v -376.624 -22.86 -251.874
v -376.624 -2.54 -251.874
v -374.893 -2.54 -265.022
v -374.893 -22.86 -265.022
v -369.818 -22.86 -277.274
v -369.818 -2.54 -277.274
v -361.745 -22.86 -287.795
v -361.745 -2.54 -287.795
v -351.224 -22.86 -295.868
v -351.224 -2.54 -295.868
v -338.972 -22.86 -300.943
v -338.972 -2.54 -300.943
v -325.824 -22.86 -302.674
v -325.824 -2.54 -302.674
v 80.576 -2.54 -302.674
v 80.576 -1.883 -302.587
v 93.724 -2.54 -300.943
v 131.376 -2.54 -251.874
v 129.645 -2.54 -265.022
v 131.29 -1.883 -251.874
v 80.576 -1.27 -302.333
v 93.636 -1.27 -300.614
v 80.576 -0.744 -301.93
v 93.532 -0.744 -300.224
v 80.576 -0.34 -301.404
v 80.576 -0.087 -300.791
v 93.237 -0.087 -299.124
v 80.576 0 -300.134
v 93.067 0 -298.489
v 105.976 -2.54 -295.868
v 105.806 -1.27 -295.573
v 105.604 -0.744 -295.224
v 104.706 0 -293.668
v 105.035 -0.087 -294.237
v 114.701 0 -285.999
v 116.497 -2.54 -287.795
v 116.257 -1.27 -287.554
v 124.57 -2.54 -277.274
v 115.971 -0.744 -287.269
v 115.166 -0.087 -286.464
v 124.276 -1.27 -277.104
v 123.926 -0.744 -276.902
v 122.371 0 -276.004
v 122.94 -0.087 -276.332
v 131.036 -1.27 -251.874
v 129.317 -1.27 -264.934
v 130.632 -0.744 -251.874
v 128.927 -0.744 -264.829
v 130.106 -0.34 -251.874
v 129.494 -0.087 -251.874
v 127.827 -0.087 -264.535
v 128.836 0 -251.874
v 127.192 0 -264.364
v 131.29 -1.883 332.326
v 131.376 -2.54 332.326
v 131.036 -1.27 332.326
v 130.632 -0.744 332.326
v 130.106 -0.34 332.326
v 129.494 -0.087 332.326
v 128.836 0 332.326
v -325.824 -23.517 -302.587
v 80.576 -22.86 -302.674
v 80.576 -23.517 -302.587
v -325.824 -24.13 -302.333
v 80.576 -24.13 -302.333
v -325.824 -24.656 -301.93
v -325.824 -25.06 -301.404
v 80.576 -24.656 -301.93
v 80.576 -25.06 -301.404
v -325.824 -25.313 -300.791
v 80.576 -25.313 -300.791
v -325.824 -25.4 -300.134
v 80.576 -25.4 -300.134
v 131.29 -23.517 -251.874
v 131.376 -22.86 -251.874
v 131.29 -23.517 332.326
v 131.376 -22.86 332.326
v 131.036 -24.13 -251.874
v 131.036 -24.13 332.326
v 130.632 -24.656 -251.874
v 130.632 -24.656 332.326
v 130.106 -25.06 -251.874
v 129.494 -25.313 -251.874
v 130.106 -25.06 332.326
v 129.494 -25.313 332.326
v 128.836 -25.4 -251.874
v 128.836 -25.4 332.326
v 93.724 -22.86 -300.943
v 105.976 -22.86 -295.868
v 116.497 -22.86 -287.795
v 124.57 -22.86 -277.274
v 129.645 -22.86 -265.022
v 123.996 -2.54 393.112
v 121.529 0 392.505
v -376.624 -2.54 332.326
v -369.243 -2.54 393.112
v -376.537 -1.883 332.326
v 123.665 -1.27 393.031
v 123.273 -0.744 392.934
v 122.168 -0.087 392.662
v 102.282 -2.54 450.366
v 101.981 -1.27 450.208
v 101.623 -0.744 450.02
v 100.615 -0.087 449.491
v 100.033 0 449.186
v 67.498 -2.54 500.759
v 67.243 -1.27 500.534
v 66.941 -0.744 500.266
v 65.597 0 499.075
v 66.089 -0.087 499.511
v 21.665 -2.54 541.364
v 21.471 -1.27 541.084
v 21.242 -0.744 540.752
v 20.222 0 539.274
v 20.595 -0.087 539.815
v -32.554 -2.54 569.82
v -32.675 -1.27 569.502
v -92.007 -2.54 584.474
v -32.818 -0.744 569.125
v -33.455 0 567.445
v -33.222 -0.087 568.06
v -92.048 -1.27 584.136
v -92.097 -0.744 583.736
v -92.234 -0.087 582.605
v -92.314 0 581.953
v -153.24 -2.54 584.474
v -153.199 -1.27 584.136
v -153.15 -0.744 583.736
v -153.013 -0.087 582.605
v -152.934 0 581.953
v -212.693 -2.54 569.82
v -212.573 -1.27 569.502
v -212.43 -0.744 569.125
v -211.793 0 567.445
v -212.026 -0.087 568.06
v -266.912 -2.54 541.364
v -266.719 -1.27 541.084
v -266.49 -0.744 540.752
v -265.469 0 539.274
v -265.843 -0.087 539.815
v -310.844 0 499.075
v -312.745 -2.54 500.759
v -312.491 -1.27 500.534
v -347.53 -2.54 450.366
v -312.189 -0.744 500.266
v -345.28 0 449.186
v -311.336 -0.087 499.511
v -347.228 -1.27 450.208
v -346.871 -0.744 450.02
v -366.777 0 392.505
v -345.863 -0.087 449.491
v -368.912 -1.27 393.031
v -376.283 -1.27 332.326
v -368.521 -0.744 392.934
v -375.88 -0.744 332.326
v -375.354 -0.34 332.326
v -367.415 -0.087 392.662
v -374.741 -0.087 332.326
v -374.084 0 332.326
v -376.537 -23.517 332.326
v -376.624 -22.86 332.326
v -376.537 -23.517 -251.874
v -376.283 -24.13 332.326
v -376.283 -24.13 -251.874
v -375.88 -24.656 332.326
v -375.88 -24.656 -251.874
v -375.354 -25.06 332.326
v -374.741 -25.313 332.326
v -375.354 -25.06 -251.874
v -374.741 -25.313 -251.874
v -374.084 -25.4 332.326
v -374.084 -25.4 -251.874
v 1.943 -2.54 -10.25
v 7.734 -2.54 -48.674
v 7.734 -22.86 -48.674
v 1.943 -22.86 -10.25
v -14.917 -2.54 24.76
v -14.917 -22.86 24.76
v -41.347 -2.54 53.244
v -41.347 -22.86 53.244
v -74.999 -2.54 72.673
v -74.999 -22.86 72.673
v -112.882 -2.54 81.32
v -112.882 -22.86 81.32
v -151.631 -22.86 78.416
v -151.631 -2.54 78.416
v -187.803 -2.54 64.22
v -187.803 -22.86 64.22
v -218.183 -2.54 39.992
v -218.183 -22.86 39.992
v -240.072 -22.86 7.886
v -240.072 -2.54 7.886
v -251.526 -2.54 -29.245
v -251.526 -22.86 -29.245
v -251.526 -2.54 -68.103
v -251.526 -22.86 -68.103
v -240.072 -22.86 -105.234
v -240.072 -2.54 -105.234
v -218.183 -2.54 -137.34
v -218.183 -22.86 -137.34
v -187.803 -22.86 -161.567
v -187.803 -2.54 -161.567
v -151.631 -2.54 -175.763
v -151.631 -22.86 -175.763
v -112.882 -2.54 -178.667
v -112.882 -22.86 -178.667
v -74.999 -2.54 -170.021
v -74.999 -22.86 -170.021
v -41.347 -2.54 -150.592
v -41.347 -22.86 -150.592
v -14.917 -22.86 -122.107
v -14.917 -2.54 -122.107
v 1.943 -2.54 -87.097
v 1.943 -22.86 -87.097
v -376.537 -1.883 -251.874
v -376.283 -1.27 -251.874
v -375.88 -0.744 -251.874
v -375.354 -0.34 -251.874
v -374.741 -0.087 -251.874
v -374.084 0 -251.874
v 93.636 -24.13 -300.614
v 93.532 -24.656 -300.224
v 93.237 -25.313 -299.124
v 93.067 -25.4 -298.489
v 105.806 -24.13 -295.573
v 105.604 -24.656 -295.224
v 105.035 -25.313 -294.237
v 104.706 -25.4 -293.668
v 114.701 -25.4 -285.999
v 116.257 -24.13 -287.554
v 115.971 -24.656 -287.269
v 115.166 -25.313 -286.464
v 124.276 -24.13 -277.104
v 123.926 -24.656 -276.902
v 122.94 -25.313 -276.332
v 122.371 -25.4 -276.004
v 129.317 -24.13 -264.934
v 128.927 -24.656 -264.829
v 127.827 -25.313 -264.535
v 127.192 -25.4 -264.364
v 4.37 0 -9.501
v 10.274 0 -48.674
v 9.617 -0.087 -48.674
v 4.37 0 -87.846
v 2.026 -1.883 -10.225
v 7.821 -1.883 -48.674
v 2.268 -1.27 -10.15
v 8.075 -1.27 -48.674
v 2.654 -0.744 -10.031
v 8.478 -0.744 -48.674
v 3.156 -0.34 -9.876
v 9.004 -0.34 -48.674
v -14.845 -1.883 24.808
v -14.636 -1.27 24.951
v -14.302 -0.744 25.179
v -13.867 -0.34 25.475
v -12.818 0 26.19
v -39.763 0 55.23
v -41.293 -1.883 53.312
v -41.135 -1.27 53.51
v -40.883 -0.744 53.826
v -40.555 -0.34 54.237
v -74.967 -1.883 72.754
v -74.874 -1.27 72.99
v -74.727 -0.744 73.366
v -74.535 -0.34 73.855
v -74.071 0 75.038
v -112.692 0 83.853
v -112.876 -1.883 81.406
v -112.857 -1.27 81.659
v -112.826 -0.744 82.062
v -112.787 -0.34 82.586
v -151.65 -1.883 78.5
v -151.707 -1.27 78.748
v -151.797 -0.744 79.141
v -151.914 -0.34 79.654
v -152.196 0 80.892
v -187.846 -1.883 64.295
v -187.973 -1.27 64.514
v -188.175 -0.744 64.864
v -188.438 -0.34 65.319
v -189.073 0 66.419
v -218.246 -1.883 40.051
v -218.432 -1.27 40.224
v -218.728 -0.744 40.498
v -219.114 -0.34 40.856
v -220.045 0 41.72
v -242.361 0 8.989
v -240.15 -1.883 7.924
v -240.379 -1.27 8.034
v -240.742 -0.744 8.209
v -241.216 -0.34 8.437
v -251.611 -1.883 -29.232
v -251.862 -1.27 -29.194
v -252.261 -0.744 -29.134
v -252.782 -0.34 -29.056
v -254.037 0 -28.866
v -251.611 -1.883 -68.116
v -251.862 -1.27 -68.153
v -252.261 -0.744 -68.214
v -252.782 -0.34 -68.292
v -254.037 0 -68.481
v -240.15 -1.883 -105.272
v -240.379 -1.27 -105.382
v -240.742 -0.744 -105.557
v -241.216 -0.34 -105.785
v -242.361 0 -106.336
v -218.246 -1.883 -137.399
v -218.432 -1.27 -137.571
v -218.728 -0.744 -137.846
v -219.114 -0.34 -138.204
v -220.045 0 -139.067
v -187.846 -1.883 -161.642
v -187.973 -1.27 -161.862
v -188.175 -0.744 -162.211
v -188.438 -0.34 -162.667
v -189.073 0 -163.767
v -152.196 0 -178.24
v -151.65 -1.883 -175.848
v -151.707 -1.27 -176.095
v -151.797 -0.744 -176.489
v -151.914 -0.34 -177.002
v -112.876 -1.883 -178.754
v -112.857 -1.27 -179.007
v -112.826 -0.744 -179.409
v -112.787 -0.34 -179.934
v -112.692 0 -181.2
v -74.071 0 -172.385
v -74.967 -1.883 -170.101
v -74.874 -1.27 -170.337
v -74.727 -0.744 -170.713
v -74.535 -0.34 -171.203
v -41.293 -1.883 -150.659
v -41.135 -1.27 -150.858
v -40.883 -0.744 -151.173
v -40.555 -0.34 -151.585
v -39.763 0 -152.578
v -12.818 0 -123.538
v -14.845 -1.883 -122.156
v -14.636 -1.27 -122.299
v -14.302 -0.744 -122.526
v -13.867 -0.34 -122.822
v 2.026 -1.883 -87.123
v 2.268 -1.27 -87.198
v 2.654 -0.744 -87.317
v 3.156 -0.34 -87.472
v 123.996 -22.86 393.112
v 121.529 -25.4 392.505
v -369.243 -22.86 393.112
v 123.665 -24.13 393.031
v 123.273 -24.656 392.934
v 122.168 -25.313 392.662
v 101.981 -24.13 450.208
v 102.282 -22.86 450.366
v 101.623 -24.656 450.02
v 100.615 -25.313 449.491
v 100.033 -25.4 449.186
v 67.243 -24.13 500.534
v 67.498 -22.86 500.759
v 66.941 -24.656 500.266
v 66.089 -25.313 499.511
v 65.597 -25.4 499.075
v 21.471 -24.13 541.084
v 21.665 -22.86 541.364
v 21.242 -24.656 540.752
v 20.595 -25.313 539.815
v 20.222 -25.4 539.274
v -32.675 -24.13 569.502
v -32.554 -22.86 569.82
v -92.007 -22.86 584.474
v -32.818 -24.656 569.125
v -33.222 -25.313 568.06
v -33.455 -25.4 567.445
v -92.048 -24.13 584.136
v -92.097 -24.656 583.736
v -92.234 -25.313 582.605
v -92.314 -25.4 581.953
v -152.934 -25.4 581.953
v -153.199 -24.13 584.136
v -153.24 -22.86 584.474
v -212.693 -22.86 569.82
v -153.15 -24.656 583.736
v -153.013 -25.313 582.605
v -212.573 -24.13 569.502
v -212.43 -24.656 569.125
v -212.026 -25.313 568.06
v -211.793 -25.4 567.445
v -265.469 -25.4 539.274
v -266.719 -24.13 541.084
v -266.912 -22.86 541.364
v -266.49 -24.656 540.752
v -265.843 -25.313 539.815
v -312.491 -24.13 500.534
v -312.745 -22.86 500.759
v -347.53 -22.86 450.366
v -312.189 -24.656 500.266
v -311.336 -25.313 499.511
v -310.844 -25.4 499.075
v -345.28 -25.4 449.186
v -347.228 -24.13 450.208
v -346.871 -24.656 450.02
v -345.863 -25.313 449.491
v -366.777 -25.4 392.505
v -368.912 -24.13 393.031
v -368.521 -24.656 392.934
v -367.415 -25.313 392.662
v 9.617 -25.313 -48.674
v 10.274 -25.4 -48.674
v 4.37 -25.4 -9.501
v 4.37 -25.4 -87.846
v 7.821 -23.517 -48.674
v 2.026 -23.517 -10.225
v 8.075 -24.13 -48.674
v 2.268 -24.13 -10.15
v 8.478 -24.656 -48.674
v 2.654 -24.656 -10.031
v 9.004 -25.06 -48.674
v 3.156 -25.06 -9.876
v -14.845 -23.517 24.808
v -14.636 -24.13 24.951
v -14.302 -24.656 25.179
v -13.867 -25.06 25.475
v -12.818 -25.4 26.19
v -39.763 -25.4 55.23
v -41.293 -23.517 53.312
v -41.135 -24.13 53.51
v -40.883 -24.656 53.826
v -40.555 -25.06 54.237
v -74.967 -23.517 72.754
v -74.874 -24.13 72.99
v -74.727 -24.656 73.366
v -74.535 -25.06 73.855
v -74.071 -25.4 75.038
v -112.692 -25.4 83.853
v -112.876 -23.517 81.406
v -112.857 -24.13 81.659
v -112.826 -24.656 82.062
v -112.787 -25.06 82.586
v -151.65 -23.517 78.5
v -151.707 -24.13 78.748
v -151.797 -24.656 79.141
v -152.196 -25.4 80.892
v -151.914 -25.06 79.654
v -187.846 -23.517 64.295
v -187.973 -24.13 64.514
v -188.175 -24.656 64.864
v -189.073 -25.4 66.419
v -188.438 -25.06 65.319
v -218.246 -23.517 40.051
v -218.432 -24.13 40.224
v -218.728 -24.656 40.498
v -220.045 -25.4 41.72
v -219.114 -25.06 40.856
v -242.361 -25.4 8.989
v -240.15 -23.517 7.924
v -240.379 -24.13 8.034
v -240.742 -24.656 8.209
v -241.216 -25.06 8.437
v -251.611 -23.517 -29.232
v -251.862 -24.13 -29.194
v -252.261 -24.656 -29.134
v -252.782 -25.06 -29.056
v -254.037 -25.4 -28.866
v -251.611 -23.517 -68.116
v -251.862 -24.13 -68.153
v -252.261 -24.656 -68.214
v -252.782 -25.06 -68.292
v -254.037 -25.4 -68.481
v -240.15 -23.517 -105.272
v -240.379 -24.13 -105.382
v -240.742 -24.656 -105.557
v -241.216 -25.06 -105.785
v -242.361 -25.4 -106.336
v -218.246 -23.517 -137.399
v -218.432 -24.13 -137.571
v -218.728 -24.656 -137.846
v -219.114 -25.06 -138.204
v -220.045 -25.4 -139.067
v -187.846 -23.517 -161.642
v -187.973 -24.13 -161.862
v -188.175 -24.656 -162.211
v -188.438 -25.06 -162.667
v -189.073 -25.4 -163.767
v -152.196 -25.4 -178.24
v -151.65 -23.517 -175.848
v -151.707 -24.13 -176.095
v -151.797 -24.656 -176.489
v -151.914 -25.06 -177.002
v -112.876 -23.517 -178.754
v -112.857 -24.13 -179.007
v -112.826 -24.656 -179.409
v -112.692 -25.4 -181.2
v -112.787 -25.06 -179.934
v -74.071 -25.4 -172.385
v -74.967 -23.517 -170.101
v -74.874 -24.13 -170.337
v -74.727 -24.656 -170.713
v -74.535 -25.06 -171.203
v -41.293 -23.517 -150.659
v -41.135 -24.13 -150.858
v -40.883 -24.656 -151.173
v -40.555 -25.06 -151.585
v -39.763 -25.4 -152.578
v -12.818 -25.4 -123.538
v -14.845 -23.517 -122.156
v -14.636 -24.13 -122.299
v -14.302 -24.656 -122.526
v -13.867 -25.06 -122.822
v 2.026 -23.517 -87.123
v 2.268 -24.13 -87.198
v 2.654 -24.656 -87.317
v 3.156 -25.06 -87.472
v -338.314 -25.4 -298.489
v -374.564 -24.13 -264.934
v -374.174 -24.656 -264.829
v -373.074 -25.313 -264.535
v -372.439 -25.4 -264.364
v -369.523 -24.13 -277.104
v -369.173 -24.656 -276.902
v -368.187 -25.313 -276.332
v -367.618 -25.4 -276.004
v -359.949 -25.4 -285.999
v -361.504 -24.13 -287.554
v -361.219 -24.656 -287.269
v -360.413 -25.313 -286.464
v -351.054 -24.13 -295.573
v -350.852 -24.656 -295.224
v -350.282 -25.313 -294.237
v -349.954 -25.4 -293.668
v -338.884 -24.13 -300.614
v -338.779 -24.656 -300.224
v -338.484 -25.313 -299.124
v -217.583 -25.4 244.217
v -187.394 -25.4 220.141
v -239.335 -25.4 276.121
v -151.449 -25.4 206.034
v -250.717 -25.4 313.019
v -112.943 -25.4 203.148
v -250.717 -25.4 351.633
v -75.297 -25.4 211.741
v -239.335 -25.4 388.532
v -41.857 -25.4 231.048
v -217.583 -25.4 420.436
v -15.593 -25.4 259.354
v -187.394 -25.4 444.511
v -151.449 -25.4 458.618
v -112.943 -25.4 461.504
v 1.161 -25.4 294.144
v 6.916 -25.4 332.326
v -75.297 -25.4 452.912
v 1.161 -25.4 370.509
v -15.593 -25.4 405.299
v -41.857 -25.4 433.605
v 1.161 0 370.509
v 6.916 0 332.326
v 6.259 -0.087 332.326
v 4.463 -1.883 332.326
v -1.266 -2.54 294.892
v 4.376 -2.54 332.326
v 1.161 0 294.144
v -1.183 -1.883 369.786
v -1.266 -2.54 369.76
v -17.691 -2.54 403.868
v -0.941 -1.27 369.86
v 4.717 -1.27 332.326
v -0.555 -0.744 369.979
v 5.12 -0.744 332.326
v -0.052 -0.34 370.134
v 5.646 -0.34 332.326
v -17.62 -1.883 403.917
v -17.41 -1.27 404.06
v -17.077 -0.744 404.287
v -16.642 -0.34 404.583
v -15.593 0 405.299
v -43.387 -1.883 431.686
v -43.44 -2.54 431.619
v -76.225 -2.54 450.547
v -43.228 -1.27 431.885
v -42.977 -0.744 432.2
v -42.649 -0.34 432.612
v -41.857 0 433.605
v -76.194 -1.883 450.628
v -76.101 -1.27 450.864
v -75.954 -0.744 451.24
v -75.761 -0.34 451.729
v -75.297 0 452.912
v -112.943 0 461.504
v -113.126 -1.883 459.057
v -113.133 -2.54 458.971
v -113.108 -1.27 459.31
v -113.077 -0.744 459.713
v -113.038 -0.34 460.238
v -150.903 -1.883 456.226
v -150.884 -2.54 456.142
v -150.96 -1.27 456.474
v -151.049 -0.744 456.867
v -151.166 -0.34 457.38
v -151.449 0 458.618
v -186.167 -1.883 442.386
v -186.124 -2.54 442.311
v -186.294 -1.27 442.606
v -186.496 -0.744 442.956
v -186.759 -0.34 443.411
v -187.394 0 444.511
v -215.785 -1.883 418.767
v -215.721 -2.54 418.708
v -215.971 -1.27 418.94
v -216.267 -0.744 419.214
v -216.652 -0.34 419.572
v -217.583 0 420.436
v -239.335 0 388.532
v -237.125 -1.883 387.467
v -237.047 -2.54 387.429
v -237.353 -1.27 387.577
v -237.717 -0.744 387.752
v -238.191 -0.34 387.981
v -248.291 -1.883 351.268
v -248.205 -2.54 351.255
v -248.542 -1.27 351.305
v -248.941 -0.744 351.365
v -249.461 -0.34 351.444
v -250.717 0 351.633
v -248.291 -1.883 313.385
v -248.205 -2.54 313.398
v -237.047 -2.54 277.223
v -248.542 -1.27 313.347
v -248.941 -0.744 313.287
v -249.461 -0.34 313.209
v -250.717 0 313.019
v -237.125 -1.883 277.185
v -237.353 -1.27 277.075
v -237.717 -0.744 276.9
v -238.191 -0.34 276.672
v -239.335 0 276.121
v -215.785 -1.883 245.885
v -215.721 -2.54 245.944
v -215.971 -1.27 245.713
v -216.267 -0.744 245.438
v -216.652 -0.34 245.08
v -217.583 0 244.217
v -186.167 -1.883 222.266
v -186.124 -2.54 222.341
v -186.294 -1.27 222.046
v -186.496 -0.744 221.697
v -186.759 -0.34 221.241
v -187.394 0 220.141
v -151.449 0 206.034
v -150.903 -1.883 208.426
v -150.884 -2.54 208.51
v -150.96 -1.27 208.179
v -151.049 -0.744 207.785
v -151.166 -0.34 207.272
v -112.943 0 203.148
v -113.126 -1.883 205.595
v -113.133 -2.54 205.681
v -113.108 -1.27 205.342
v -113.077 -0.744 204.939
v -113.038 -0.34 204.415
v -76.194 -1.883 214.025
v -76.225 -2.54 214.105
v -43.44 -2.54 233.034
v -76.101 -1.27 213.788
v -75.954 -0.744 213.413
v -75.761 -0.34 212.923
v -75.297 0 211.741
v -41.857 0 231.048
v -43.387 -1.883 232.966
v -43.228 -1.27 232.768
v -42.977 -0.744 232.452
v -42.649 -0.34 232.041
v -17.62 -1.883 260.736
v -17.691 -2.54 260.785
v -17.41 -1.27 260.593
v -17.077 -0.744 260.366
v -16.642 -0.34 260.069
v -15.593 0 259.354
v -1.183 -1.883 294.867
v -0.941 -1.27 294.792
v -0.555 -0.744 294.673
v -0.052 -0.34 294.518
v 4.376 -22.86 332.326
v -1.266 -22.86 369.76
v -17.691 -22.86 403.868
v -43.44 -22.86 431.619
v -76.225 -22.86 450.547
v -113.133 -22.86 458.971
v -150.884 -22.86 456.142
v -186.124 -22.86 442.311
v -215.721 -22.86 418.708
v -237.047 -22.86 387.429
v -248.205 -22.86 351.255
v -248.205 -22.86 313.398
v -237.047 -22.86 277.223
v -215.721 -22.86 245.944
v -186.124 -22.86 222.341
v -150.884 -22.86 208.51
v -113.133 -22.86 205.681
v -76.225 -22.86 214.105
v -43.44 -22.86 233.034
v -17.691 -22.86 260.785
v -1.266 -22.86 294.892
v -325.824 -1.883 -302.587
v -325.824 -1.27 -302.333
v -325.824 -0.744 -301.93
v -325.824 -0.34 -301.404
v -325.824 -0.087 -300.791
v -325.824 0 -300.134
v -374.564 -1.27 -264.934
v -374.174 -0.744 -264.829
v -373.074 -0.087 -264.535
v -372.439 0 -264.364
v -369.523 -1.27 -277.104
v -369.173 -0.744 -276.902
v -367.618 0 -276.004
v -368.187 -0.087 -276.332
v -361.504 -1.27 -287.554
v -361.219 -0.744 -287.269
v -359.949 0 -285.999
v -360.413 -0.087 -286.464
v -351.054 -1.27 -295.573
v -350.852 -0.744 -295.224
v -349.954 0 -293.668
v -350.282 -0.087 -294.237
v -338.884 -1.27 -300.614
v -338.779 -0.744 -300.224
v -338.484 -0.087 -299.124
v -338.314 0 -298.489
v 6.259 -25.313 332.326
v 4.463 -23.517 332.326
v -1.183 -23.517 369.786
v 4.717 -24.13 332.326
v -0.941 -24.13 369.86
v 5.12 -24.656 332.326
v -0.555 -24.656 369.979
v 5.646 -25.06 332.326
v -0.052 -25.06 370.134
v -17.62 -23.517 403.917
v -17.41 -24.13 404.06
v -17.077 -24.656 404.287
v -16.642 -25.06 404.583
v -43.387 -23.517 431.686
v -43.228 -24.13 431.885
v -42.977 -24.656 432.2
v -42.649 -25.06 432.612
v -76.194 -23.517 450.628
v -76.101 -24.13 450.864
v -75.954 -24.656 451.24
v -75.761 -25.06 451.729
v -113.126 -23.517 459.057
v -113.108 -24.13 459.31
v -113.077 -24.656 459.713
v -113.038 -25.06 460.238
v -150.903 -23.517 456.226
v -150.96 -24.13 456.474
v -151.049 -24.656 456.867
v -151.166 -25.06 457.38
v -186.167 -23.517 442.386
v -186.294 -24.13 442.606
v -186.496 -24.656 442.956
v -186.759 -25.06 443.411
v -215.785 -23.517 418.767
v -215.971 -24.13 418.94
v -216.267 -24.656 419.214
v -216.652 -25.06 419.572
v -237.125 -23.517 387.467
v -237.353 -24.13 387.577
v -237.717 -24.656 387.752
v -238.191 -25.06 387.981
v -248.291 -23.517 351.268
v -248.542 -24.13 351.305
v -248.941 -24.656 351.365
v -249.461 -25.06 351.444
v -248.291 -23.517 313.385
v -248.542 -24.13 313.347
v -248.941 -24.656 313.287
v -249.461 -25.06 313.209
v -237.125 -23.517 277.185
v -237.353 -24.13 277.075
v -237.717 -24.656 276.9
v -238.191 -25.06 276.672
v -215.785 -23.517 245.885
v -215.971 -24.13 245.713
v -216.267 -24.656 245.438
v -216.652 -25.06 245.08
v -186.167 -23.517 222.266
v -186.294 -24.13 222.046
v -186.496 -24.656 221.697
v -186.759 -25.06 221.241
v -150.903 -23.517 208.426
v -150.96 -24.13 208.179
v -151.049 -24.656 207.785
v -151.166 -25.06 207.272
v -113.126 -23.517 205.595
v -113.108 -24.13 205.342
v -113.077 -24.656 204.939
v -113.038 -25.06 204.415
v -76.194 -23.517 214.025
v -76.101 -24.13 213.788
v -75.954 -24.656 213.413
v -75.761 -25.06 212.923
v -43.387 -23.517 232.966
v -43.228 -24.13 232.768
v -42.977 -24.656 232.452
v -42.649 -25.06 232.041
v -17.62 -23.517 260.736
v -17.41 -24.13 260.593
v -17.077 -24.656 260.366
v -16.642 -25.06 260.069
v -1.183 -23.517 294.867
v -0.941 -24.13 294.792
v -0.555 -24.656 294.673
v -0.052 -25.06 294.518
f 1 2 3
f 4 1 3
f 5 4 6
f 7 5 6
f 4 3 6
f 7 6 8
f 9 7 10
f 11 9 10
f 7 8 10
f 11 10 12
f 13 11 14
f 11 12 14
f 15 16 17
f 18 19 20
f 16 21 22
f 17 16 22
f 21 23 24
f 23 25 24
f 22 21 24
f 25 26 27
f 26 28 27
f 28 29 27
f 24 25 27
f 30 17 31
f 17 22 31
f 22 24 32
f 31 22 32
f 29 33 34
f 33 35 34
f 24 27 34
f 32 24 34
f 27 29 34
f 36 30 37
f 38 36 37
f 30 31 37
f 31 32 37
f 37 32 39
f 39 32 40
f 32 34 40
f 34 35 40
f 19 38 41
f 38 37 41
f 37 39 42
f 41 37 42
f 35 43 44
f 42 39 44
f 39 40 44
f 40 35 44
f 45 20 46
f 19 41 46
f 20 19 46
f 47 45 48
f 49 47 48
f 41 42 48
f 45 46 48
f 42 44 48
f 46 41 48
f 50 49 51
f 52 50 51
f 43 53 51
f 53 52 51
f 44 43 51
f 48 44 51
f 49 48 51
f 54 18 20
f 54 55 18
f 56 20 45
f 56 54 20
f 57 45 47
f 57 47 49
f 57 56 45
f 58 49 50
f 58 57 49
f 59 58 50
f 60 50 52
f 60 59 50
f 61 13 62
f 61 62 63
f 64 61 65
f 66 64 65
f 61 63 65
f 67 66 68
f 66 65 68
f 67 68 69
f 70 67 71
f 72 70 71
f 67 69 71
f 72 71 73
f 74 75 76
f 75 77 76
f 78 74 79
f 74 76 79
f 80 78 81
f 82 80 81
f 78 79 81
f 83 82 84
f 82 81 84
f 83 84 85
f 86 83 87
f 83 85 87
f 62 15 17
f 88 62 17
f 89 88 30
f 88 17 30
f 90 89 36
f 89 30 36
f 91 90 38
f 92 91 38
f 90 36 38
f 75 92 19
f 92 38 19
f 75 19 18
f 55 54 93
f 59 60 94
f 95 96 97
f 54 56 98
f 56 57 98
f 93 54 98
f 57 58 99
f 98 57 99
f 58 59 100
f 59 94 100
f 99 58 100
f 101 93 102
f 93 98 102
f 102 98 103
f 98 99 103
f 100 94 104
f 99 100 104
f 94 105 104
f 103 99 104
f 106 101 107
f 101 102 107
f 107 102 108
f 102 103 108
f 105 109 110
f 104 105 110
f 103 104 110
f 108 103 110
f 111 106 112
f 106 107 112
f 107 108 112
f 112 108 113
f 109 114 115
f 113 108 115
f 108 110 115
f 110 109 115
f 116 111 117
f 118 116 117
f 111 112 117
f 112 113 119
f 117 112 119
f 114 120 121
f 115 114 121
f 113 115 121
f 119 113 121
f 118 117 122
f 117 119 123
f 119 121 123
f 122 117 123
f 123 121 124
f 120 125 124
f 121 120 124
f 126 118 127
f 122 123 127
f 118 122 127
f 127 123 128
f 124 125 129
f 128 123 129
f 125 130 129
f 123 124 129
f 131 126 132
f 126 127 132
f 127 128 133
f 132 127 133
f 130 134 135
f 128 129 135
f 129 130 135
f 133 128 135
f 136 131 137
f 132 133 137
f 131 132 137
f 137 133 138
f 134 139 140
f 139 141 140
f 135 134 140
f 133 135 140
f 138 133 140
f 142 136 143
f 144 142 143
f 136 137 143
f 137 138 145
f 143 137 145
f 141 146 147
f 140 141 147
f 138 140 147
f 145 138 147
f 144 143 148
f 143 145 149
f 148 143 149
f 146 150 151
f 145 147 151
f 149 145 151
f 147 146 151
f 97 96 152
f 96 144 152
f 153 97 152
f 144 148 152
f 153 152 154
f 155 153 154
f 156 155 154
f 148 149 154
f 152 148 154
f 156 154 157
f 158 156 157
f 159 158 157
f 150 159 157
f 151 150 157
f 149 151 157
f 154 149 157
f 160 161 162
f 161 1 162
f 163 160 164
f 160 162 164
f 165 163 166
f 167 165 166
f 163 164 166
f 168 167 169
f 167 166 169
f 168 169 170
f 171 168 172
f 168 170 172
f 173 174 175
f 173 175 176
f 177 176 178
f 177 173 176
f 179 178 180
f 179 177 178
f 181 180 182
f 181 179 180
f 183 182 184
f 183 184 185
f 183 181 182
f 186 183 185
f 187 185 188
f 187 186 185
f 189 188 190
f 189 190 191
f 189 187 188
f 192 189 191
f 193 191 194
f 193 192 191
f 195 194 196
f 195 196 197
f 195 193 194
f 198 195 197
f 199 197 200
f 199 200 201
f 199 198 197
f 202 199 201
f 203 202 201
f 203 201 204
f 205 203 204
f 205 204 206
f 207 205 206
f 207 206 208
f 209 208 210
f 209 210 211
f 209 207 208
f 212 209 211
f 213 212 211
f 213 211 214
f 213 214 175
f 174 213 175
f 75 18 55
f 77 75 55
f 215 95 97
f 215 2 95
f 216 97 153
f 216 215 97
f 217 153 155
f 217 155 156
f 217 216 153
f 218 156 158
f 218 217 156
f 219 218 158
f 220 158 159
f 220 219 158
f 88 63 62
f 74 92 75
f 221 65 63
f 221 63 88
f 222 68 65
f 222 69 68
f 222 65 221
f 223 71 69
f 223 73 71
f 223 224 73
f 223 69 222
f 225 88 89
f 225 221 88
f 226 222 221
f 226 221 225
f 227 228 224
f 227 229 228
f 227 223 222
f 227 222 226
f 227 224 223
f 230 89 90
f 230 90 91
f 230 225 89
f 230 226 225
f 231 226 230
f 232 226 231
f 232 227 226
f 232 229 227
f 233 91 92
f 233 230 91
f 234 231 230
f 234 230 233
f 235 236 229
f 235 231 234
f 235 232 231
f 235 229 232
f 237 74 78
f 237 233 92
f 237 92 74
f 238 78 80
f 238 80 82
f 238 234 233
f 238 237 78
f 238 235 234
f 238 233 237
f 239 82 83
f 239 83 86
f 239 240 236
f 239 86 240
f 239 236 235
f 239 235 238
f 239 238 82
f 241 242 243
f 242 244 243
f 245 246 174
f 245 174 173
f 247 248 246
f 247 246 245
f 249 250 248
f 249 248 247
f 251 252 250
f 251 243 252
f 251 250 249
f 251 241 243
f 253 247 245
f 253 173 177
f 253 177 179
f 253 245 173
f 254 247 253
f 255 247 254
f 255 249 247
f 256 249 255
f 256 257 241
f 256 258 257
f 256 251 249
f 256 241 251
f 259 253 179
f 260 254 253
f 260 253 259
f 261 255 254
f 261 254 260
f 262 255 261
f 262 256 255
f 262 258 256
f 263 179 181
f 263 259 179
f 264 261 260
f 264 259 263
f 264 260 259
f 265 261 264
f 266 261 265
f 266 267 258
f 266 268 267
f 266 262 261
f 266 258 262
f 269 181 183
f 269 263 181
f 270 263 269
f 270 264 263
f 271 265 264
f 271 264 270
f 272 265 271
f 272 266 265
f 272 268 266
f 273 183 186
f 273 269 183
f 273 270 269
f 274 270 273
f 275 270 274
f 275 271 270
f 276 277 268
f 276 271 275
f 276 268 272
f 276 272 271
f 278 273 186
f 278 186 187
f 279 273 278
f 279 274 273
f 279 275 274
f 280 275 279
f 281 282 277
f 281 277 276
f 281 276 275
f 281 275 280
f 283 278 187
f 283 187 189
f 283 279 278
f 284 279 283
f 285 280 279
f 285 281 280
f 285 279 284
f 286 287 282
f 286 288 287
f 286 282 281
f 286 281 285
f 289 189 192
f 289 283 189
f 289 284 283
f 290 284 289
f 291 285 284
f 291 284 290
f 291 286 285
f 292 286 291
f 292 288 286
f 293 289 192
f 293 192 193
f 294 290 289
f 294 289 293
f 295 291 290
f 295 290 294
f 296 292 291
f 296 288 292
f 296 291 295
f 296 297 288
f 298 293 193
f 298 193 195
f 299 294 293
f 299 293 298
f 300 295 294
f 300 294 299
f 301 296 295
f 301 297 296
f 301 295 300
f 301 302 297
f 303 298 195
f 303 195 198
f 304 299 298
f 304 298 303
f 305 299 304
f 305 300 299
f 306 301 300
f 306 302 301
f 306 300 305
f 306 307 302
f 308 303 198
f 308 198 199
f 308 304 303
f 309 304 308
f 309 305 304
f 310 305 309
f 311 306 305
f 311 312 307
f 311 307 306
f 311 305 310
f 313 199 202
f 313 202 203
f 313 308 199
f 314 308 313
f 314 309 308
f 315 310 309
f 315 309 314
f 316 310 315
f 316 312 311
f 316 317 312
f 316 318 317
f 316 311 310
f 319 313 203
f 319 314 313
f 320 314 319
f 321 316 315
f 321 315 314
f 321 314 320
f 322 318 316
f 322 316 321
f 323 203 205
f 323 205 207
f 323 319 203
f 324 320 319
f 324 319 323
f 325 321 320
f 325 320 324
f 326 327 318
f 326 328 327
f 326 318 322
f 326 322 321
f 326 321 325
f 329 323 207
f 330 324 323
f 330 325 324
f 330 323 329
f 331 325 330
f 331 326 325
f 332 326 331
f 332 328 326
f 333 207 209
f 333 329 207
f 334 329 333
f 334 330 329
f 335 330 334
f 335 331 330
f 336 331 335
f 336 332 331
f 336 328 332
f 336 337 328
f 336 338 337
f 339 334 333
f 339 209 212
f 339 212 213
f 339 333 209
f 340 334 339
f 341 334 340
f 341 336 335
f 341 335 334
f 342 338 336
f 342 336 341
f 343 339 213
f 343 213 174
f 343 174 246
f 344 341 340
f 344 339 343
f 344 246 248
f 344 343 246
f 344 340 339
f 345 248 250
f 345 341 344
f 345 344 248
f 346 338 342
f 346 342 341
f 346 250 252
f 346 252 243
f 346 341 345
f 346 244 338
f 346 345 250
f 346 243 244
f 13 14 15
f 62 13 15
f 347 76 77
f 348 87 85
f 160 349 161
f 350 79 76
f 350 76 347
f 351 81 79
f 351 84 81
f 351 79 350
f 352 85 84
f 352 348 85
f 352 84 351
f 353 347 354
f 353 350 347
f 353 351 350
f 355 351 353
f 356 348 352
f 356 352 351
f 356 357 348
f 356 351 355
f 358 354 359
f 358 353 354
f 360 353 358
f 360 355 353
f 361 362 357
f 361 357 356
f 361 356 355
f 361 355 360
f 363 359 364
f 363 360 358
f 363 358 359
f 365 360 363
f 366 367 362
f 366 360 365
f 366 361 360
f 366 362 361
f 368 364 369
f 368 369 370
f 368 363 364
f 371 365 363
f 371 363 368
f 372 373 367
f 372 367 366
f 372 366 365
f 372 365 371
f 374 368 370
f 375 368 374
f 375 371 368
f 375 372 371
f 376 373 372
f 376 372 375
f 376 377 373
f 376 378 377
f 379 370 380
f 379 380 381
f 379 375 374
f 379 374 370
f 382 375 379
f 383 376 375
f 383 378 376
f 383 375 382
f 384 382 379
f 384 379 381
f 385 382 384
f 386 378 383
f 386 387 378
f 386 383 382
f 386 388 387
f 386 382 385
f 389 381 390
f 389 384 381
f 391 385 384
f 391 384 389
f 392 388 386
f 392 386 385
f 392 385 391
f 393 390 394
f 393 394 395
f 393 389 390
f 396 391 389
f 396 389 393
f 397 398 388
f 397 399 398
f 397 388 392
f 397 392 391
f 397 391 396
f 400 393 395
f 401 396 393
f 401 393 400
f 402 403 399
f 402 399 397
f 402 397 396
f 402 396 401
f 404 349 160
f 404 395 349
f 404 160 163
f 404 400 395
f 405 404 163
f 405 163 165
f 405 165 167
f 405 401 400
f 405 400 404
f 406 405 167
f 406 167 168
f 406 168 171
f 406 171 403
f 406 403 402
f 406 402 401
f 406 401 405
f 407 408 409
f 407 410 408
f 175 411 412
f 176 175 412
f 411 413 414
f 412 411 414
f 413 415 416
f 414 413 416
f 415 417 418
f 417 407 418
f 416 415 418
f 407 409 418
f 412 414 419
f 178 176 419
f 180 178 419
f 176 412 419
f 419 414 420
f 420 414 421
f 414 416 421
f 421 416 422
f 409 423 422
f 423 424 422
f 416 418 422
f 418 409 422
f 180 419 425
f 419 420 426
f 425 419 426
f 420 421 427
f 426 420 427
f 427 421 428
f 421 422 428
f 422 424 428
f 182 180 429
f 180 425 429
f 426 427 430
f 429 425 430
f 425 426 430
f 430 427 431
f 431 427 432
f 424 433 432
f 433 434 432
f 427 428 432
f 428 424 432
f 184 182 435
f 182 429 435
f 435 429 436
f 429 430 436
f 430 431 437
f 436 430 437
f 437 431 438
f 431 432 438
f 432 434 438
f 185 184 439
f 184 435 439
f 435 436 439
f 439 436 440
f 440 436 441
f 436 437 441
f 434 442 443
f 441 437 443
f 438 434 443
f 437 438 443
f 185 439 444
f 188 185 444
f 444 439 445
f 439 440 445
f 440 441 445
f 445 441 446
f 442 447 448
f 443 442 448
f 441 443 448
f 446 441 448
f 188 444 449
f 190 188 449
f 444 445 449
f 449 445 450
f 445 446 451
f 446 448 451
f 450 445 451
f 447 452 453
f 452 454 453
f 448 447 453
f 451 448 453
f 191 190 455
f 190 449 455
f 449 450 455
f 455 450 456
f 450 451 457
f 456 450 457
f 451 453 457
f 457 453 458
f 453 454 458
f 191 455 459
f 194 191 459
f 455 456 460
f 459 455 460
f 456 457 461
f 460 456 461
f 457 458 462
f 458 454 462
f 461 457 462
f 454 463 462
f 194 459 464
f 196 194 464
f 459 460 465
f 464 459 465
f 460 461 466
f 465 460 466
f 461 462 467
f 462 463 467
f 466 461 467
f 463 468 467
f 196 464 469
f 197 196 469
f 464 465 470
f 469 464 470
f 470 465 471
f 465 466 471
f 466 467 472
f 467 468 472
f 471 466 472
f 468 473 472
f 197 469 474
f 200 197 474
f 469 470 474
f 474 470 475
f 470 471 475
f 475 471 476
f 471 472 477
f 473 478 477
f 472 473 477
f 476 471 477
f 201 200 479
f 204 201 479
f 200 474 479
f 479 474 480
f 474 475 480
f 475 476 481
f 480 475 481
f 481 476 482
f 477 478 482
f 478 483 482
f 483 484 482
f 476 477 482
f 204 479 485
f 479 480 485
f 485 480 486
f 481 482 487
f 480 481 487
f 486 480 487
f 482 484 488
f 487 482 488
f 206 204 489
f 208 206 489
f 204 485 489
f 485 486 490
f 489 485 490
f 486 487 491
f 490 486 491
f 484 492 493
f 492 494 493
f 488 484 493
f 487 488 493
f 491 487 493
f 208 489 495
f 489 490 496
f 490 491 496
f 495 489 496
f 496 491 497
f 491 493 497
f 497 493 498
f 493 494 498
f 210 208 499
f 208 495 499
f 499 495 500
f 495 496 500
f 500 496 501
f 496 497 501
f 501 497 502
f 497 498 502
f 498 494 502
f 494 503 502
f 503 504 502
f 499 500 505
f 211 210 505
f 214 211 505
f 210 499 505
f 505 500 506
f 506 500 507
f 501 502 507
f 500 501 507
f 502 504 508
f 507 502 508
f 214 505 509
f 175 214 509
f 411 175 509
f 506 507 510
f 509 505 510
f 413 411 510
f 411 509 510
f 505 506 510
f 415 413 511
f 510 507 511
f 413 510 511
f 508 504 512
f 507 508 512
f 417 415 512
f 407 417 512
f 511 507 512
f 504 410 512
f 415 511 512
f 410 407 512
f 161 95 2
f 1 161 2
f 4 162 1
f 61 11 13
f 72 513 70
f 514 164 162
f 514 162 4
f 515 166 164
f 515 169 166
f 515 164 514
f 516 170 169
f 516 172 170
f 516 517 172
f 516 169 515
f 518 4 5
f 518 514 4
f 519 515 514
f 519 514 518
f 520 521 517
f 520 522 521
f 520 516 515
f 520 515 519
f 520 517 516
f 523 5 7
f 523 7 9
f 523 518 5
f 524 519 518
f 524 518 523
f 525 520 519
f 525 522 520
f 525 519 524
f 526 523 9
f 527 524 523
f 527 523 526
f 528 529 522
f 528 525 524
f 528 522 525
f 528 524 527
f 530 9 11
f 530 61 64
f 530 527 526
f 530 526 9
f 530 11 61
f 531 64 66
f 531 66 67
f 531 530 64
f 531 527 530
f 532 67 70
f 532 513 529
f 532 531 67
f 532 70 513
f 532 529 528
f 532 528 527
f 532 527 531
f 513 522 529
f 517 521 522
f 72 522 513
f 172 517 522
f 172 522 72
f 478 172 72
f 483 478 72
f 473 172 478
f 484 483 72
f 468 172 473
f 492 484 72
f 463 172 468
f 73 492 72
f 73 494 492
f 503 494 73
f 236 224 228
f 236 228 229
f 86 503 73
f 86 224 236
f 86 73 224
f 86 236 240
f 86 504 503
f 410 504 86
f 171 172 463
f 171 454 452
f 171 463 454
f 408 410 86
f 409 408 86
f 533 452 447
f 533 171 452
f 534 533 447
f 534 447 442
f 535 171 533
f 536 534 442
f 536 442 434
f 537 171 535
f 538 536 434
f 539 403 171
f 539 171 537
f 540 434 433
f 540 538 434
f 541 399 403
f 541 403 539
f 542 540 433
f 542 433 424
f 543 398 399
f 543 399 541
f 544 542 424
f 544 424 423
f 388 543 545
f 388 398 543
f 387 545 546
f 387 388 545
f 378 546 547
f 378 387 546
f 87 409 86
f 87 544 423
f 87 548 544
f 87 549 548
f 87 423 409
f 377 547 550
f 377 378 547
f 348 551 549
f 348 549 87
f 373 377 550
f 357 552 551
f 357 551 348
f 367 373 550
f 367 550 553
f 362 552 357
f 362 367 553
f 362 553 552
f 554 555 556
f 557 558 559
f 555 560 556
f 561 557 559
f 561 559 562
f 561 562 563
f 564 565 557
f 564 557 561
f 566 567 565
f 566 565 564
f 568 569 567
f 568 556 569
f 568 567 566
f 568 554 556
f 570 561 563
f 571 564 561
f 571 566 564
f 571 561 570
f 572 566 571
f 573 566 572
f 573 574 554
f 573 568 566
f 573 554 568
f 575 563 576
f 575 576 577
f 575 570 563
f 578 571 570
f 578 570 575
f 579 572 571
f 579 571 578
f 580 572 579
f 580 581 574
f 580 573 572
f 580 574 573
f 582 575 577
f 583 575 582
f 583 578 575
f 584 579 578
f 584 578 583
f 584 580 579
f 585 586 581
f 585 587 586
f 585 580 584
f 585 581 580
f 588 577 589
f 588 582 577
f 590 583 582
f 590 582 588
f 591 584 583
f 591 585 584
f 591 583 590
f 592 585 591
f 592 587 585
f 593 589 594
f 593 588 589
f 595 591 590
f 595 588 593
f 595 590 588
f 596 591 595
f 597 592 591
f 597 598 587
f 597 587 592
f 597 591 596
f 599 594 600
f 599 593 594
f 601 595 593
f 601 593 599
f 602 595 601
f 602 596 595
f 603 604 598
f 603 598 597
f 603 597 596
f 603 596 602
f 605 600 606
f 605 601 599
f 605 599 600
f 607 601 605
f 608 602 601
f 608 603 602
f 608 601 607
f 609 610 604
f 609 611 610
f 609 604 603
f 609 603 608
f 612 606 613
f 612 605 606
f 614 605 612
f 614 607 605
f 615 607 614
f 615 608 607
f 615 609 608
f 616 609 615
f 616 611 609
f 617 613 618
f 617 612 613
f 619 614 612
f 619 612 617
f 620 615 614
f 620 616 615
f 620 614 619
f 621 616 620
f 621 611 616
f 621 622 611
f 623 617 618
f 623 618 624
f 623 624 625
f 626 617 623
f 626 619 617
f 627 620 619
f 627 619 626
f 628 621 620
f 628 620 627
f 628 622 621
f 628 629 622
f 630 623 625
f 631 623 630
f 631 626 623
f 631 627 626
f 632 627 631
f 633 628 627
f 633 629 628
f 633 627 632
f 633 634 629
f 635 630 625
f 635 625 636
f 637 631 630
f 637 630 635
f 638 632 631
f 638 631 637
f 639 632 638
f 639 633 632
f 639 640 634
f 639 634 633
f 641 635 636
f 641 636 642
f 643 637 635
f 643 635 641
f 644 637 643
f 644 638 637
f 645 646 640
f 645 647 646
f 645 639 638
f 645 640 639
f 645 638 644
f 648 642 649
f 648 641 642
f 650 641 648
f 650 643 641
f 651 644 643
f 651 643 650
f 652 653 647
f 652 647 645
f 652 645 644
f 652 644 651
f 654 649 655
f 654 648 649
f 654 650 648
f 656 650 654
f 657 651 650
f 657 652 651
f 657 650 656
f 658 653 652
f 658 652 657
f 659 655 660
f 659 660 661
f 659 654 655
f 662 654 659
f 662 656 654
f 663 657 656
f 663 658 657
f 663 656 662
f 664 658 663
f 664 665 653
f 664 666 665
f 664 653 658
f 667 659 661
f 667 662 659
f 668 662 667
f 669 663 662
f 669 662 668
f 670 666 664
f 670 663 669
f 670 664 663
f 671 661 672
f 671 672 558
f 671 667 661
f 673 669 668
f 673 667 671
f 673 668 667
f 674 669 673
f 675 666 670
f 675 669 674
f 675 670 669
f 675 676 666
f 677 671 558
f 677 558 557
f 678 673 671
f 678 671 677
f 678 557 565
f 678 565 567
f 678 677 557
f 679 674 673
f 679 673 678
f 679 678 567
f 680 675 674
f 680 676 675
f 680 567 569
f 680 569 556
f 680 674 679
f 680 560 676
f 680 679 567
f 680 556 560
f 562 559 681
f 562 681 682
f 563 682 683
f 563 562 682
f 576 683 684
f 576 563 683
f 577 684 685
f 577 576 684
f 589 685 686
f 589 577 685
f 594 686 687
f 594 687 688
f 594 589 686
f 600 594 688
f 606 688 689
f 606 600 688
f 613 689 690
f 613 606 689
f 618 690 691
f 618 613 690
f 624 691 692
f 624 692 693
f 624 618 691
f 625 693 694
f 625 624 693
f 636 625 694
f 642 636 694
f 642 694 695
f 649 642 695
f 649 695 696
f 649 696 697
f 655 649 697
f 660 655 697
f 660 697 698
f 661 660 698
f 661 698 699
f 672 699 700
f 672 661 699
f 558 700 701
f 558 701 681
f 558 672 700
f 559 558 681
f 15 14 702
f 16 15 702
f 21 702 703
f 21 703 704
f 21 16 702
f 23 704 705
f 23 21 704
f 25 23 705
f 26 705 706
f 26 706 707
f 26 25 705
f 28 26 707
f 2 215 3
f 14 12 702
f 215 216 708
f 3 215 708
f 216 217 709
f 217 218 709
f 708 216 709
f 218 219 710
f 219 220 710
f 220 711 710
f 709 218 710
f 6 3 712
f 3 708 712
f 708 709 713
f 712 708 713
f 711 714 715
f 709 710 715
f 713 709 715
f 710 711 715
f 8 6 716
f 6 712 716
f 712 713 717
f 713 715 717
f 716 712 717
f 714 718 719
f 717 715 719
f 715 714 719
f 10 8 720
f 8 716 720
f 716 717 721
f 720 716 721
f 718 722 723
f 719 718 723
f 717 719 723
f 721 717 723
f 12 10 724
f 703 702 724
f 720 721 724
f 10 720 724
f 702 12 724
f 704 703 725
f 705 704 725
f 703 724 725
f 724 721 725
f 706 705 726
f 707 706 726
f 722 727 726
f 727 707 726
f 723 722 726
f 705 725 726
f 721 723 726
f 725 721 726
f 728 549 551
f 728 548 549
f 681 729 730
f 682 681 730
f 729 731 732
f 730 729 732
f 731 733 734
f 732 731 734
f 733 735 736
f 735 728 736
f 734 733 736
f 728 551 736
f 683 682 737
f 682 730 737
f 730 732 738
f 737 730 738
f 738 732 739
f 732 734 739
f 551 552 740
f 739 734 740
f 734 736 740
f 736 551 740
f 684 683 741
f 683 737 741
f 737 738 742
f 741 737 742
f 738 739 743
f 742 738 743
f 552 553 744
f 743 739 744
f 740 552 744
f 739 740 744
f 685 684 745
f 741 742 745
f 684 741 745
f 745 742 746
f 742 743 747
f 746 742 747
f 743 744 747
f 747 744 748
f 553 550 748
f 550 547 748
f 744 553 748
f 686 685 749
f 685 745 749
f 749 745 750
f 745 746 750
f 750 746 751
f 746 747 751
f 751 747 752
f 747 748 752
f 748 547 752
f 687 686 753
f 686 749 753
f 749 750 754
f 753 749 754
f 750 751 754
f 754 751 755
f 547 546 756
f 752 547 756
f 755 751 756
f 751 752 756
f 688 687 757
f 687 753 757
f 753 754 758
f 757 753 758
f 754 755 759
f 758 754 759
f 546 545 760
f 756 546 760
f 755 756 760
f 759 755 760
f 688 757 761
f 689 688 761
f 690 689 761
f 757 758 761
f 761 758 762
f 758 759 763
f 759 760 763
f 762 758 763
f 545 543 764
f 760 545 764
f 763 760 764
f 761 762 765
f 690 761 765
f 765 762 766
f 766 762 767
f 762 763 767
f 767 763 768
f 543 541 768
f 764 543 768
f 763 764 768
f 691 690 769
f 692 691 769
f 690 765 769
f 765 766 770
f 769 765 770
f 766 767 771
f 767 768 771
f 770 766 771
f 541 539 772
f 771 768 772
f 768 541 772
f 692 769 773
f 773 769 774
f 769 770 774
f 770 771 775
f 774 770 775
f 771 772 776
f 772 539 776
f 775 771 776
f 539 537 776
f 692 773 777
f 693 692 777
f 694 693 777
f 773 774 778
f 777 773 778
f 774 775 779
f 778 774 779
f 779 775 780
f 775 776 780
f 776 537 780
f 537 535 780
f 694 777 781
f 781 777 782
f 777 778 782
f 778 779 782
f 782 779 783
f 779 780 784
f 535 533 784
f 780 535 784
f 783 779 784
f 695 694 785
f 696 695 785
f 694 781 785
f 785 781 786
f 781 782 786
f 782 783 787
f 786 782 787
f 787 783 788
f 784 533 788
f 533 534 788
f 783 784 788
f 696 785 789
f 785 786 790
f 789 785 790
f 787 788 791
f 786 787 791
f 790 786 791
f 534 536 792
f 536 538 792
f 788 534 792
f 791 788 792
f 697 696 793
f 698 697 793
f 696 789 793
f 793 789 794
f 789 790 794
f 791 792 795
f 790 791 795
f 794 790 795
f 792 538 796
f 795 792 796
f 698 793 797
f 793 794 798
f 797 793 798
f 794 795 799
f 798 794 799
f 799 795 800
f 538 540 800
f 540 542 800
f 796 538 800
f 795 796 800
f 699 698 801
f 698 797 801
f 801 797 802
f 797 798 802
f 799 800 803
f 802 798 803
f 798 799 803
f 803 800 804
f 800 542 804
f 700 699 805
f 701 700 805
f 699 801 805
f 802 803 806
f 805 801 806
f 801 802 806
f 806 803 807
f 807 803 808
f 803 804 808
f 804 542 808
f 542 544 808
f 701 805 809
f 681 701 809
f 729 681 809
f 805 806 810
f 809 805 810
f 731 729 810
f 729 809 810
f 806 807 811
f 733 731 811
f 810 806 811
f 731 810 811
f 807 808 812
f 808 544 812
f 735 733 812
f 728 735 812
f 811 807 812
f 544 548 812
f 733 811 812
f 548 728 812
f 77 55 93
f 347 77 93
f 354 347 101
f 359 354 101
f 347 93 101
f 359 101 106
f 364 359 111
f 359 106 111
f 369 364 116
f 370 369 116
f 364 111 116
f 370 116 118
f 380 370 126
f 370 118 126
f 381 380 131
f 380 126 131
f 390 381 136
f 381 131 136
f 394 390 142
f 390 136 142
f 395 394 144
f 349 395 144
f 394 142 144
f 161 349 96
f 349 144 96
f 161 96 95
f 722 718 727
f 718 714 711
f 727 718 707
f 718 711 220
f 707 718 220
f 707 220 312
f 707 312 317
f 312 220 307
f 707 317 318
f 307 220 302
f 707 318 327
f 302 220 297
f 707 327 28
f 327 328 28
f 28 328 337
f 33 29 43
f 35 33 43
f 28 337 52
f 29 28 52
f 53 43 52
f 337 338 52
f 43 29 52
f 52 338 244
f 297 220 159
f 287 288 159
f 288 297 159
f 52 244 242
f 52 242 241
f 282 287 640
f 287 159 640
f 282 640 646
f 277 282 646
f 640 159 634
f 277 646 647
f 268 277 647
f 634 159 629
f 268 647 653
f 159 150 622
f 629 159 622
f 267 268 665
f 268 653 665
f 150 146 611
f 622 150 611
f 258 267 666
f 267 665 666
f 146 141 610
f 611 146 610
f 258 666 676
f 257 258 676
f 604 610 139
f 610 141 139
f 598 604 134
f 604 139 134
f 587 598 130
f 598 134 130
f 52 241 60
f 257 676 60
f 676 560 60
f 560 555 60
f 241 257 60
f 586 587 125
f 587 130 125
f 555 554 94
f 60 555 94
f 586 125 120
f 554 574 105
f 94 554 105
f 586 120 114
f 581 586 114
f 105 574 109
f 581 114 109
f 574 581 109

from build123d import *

# Parameters (mm, degrees)
F0_R     = 130.3580265026
F0_R_2   = 127
F1_DEPTH = 25.4
F2_R     = 2.54


# Not quite as in the source:
# - a feature names something its author has since deleted; it is built from what else it names


with BuildPart() as f1:
    # F0 (on Front) → F1 (new body)
    with BuildSketch(Plane.XZ):
        with BuildLine():
            ThreePointArc((-376.6236739159, -251.8737668991), (-361.7446984001, -287.7947913834), (-325.8236739159, -302.6737668991))
            Line((-325.8236739159, -302.6737668991), (80.5763260841, -302.6737668991))
            ThreePointArc((80.5763260841, -302.6737668991), (116.4973505684, -287.7947913834), (131.3763260841, -251.8737668991))
            Line((131.3763260841, -251.8737668991), (131.3763260841, 332.3262331009))
            ThreePointArc((131.3763260841, 332.3262331009), (56.9814485055, 511.9313555223), (-122.6236739159, 586.3262331009))
            ThreePointArc((-122.6236739159, 586.3262331009), (-302.2287963372, 511.9313555223), (-376.6236739159, 332.3262331009))
            Line((-376.6236739159, 332.3262331009), (-376.6236739159, -251.8737668991))
        make_face()
        with Locations((-122.6236739159, -48.6737668991)):
            Circle(F0_R, mode=Mode.SUBTRACT)
        with Locations((-122.6236739159, 332.3262331009)):
            Circle(F0_R_2, mode=Mode.SUBTRACT)
    extrude(amount=F1_DEPTH)

    # F2
    f2_edges = [f1.edges().sort_by_distance(p)[0] for p in [
        (131.376326, -25.4, 40.226233),
        (-122.623674, -25.4, -302.673767),
        (-376.623674, -25.4, 40.226233),
        (-122.623674, -25.4, 586.326233),
        (-249.623674, -25.4, 332.326233),
        (-249.623674, 0, 332.326233),
        (-376.623674, 0, 40.226233),
        (-122.623674, 0, 586.326233),
        (131.376326, 0, 40.226233),
        (-122.623674, 0, -302.673767),
        (-361.744698, 0, -287.794791),
        (116.497351, 0, -287.794791),
        (-252.9817, 0, -48.673767),
        (7.734353, -12.7, -48.673767),
        (-252.9817, -25.4, -48.673767),
        (-376.623674, -12.7, -251.873767),
        (-325.823674, -12.7, -302.673767),
        (-361.744698, -25.4, -287.794791),
        (116.497351, -25.4, -287.794791),
    ]]
    fillet(f2_edges, radius=F2_R)


solid = f1.part
